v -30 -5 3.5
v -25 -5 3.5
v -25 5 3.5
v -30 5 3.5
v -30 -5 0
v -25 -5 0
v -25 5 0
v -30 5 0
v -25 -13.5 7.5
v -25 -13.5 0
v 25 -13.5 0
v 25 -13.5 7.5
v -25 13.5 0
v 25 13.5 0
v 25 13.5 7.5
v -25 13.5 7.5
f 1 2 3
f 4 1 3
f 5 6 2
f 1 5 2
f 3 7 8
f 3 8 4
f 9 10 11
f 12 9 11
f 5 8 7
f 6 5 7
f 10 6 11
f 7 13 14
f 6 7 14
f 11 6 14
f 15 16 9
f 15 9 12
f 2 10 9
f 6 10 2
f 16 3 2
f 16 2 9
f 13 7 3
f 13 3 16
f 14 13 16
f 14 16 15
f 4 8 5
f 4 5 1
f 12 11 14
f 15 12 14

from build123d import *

# Parameters (mm, degrees)
SKETCH1_W           = 50
SKETCH1_H           = 27
BOSS_EXTRUDE1_DEPTH = 7.5
SKETCH2_W           = 3.5
SKETCH2_H           = 10
BOSS_EXTRUDE2_DEPTH = 5


with BuildPart() as part:
    # Sketch1 → Boss-Extrude1 (new body)
    with BuildSketch(Plane.XY):
        Rectangle(SKETCH1_W, SKETCH1_H)
    extrude(amount=BOSS_EXTRUDE1_DEPTH)

    # Sketch2 → Boss-Extrude2 (add)
    with BuildSketch(Plane.ZY.offset(25)):
        with Locations((1.75, 0)):
            Rectangle(SKETCH2_W, SKETCH2_H)
    extrude(amount=BOSS_EXTRUDE2_DEPTH)


solid = part.part
